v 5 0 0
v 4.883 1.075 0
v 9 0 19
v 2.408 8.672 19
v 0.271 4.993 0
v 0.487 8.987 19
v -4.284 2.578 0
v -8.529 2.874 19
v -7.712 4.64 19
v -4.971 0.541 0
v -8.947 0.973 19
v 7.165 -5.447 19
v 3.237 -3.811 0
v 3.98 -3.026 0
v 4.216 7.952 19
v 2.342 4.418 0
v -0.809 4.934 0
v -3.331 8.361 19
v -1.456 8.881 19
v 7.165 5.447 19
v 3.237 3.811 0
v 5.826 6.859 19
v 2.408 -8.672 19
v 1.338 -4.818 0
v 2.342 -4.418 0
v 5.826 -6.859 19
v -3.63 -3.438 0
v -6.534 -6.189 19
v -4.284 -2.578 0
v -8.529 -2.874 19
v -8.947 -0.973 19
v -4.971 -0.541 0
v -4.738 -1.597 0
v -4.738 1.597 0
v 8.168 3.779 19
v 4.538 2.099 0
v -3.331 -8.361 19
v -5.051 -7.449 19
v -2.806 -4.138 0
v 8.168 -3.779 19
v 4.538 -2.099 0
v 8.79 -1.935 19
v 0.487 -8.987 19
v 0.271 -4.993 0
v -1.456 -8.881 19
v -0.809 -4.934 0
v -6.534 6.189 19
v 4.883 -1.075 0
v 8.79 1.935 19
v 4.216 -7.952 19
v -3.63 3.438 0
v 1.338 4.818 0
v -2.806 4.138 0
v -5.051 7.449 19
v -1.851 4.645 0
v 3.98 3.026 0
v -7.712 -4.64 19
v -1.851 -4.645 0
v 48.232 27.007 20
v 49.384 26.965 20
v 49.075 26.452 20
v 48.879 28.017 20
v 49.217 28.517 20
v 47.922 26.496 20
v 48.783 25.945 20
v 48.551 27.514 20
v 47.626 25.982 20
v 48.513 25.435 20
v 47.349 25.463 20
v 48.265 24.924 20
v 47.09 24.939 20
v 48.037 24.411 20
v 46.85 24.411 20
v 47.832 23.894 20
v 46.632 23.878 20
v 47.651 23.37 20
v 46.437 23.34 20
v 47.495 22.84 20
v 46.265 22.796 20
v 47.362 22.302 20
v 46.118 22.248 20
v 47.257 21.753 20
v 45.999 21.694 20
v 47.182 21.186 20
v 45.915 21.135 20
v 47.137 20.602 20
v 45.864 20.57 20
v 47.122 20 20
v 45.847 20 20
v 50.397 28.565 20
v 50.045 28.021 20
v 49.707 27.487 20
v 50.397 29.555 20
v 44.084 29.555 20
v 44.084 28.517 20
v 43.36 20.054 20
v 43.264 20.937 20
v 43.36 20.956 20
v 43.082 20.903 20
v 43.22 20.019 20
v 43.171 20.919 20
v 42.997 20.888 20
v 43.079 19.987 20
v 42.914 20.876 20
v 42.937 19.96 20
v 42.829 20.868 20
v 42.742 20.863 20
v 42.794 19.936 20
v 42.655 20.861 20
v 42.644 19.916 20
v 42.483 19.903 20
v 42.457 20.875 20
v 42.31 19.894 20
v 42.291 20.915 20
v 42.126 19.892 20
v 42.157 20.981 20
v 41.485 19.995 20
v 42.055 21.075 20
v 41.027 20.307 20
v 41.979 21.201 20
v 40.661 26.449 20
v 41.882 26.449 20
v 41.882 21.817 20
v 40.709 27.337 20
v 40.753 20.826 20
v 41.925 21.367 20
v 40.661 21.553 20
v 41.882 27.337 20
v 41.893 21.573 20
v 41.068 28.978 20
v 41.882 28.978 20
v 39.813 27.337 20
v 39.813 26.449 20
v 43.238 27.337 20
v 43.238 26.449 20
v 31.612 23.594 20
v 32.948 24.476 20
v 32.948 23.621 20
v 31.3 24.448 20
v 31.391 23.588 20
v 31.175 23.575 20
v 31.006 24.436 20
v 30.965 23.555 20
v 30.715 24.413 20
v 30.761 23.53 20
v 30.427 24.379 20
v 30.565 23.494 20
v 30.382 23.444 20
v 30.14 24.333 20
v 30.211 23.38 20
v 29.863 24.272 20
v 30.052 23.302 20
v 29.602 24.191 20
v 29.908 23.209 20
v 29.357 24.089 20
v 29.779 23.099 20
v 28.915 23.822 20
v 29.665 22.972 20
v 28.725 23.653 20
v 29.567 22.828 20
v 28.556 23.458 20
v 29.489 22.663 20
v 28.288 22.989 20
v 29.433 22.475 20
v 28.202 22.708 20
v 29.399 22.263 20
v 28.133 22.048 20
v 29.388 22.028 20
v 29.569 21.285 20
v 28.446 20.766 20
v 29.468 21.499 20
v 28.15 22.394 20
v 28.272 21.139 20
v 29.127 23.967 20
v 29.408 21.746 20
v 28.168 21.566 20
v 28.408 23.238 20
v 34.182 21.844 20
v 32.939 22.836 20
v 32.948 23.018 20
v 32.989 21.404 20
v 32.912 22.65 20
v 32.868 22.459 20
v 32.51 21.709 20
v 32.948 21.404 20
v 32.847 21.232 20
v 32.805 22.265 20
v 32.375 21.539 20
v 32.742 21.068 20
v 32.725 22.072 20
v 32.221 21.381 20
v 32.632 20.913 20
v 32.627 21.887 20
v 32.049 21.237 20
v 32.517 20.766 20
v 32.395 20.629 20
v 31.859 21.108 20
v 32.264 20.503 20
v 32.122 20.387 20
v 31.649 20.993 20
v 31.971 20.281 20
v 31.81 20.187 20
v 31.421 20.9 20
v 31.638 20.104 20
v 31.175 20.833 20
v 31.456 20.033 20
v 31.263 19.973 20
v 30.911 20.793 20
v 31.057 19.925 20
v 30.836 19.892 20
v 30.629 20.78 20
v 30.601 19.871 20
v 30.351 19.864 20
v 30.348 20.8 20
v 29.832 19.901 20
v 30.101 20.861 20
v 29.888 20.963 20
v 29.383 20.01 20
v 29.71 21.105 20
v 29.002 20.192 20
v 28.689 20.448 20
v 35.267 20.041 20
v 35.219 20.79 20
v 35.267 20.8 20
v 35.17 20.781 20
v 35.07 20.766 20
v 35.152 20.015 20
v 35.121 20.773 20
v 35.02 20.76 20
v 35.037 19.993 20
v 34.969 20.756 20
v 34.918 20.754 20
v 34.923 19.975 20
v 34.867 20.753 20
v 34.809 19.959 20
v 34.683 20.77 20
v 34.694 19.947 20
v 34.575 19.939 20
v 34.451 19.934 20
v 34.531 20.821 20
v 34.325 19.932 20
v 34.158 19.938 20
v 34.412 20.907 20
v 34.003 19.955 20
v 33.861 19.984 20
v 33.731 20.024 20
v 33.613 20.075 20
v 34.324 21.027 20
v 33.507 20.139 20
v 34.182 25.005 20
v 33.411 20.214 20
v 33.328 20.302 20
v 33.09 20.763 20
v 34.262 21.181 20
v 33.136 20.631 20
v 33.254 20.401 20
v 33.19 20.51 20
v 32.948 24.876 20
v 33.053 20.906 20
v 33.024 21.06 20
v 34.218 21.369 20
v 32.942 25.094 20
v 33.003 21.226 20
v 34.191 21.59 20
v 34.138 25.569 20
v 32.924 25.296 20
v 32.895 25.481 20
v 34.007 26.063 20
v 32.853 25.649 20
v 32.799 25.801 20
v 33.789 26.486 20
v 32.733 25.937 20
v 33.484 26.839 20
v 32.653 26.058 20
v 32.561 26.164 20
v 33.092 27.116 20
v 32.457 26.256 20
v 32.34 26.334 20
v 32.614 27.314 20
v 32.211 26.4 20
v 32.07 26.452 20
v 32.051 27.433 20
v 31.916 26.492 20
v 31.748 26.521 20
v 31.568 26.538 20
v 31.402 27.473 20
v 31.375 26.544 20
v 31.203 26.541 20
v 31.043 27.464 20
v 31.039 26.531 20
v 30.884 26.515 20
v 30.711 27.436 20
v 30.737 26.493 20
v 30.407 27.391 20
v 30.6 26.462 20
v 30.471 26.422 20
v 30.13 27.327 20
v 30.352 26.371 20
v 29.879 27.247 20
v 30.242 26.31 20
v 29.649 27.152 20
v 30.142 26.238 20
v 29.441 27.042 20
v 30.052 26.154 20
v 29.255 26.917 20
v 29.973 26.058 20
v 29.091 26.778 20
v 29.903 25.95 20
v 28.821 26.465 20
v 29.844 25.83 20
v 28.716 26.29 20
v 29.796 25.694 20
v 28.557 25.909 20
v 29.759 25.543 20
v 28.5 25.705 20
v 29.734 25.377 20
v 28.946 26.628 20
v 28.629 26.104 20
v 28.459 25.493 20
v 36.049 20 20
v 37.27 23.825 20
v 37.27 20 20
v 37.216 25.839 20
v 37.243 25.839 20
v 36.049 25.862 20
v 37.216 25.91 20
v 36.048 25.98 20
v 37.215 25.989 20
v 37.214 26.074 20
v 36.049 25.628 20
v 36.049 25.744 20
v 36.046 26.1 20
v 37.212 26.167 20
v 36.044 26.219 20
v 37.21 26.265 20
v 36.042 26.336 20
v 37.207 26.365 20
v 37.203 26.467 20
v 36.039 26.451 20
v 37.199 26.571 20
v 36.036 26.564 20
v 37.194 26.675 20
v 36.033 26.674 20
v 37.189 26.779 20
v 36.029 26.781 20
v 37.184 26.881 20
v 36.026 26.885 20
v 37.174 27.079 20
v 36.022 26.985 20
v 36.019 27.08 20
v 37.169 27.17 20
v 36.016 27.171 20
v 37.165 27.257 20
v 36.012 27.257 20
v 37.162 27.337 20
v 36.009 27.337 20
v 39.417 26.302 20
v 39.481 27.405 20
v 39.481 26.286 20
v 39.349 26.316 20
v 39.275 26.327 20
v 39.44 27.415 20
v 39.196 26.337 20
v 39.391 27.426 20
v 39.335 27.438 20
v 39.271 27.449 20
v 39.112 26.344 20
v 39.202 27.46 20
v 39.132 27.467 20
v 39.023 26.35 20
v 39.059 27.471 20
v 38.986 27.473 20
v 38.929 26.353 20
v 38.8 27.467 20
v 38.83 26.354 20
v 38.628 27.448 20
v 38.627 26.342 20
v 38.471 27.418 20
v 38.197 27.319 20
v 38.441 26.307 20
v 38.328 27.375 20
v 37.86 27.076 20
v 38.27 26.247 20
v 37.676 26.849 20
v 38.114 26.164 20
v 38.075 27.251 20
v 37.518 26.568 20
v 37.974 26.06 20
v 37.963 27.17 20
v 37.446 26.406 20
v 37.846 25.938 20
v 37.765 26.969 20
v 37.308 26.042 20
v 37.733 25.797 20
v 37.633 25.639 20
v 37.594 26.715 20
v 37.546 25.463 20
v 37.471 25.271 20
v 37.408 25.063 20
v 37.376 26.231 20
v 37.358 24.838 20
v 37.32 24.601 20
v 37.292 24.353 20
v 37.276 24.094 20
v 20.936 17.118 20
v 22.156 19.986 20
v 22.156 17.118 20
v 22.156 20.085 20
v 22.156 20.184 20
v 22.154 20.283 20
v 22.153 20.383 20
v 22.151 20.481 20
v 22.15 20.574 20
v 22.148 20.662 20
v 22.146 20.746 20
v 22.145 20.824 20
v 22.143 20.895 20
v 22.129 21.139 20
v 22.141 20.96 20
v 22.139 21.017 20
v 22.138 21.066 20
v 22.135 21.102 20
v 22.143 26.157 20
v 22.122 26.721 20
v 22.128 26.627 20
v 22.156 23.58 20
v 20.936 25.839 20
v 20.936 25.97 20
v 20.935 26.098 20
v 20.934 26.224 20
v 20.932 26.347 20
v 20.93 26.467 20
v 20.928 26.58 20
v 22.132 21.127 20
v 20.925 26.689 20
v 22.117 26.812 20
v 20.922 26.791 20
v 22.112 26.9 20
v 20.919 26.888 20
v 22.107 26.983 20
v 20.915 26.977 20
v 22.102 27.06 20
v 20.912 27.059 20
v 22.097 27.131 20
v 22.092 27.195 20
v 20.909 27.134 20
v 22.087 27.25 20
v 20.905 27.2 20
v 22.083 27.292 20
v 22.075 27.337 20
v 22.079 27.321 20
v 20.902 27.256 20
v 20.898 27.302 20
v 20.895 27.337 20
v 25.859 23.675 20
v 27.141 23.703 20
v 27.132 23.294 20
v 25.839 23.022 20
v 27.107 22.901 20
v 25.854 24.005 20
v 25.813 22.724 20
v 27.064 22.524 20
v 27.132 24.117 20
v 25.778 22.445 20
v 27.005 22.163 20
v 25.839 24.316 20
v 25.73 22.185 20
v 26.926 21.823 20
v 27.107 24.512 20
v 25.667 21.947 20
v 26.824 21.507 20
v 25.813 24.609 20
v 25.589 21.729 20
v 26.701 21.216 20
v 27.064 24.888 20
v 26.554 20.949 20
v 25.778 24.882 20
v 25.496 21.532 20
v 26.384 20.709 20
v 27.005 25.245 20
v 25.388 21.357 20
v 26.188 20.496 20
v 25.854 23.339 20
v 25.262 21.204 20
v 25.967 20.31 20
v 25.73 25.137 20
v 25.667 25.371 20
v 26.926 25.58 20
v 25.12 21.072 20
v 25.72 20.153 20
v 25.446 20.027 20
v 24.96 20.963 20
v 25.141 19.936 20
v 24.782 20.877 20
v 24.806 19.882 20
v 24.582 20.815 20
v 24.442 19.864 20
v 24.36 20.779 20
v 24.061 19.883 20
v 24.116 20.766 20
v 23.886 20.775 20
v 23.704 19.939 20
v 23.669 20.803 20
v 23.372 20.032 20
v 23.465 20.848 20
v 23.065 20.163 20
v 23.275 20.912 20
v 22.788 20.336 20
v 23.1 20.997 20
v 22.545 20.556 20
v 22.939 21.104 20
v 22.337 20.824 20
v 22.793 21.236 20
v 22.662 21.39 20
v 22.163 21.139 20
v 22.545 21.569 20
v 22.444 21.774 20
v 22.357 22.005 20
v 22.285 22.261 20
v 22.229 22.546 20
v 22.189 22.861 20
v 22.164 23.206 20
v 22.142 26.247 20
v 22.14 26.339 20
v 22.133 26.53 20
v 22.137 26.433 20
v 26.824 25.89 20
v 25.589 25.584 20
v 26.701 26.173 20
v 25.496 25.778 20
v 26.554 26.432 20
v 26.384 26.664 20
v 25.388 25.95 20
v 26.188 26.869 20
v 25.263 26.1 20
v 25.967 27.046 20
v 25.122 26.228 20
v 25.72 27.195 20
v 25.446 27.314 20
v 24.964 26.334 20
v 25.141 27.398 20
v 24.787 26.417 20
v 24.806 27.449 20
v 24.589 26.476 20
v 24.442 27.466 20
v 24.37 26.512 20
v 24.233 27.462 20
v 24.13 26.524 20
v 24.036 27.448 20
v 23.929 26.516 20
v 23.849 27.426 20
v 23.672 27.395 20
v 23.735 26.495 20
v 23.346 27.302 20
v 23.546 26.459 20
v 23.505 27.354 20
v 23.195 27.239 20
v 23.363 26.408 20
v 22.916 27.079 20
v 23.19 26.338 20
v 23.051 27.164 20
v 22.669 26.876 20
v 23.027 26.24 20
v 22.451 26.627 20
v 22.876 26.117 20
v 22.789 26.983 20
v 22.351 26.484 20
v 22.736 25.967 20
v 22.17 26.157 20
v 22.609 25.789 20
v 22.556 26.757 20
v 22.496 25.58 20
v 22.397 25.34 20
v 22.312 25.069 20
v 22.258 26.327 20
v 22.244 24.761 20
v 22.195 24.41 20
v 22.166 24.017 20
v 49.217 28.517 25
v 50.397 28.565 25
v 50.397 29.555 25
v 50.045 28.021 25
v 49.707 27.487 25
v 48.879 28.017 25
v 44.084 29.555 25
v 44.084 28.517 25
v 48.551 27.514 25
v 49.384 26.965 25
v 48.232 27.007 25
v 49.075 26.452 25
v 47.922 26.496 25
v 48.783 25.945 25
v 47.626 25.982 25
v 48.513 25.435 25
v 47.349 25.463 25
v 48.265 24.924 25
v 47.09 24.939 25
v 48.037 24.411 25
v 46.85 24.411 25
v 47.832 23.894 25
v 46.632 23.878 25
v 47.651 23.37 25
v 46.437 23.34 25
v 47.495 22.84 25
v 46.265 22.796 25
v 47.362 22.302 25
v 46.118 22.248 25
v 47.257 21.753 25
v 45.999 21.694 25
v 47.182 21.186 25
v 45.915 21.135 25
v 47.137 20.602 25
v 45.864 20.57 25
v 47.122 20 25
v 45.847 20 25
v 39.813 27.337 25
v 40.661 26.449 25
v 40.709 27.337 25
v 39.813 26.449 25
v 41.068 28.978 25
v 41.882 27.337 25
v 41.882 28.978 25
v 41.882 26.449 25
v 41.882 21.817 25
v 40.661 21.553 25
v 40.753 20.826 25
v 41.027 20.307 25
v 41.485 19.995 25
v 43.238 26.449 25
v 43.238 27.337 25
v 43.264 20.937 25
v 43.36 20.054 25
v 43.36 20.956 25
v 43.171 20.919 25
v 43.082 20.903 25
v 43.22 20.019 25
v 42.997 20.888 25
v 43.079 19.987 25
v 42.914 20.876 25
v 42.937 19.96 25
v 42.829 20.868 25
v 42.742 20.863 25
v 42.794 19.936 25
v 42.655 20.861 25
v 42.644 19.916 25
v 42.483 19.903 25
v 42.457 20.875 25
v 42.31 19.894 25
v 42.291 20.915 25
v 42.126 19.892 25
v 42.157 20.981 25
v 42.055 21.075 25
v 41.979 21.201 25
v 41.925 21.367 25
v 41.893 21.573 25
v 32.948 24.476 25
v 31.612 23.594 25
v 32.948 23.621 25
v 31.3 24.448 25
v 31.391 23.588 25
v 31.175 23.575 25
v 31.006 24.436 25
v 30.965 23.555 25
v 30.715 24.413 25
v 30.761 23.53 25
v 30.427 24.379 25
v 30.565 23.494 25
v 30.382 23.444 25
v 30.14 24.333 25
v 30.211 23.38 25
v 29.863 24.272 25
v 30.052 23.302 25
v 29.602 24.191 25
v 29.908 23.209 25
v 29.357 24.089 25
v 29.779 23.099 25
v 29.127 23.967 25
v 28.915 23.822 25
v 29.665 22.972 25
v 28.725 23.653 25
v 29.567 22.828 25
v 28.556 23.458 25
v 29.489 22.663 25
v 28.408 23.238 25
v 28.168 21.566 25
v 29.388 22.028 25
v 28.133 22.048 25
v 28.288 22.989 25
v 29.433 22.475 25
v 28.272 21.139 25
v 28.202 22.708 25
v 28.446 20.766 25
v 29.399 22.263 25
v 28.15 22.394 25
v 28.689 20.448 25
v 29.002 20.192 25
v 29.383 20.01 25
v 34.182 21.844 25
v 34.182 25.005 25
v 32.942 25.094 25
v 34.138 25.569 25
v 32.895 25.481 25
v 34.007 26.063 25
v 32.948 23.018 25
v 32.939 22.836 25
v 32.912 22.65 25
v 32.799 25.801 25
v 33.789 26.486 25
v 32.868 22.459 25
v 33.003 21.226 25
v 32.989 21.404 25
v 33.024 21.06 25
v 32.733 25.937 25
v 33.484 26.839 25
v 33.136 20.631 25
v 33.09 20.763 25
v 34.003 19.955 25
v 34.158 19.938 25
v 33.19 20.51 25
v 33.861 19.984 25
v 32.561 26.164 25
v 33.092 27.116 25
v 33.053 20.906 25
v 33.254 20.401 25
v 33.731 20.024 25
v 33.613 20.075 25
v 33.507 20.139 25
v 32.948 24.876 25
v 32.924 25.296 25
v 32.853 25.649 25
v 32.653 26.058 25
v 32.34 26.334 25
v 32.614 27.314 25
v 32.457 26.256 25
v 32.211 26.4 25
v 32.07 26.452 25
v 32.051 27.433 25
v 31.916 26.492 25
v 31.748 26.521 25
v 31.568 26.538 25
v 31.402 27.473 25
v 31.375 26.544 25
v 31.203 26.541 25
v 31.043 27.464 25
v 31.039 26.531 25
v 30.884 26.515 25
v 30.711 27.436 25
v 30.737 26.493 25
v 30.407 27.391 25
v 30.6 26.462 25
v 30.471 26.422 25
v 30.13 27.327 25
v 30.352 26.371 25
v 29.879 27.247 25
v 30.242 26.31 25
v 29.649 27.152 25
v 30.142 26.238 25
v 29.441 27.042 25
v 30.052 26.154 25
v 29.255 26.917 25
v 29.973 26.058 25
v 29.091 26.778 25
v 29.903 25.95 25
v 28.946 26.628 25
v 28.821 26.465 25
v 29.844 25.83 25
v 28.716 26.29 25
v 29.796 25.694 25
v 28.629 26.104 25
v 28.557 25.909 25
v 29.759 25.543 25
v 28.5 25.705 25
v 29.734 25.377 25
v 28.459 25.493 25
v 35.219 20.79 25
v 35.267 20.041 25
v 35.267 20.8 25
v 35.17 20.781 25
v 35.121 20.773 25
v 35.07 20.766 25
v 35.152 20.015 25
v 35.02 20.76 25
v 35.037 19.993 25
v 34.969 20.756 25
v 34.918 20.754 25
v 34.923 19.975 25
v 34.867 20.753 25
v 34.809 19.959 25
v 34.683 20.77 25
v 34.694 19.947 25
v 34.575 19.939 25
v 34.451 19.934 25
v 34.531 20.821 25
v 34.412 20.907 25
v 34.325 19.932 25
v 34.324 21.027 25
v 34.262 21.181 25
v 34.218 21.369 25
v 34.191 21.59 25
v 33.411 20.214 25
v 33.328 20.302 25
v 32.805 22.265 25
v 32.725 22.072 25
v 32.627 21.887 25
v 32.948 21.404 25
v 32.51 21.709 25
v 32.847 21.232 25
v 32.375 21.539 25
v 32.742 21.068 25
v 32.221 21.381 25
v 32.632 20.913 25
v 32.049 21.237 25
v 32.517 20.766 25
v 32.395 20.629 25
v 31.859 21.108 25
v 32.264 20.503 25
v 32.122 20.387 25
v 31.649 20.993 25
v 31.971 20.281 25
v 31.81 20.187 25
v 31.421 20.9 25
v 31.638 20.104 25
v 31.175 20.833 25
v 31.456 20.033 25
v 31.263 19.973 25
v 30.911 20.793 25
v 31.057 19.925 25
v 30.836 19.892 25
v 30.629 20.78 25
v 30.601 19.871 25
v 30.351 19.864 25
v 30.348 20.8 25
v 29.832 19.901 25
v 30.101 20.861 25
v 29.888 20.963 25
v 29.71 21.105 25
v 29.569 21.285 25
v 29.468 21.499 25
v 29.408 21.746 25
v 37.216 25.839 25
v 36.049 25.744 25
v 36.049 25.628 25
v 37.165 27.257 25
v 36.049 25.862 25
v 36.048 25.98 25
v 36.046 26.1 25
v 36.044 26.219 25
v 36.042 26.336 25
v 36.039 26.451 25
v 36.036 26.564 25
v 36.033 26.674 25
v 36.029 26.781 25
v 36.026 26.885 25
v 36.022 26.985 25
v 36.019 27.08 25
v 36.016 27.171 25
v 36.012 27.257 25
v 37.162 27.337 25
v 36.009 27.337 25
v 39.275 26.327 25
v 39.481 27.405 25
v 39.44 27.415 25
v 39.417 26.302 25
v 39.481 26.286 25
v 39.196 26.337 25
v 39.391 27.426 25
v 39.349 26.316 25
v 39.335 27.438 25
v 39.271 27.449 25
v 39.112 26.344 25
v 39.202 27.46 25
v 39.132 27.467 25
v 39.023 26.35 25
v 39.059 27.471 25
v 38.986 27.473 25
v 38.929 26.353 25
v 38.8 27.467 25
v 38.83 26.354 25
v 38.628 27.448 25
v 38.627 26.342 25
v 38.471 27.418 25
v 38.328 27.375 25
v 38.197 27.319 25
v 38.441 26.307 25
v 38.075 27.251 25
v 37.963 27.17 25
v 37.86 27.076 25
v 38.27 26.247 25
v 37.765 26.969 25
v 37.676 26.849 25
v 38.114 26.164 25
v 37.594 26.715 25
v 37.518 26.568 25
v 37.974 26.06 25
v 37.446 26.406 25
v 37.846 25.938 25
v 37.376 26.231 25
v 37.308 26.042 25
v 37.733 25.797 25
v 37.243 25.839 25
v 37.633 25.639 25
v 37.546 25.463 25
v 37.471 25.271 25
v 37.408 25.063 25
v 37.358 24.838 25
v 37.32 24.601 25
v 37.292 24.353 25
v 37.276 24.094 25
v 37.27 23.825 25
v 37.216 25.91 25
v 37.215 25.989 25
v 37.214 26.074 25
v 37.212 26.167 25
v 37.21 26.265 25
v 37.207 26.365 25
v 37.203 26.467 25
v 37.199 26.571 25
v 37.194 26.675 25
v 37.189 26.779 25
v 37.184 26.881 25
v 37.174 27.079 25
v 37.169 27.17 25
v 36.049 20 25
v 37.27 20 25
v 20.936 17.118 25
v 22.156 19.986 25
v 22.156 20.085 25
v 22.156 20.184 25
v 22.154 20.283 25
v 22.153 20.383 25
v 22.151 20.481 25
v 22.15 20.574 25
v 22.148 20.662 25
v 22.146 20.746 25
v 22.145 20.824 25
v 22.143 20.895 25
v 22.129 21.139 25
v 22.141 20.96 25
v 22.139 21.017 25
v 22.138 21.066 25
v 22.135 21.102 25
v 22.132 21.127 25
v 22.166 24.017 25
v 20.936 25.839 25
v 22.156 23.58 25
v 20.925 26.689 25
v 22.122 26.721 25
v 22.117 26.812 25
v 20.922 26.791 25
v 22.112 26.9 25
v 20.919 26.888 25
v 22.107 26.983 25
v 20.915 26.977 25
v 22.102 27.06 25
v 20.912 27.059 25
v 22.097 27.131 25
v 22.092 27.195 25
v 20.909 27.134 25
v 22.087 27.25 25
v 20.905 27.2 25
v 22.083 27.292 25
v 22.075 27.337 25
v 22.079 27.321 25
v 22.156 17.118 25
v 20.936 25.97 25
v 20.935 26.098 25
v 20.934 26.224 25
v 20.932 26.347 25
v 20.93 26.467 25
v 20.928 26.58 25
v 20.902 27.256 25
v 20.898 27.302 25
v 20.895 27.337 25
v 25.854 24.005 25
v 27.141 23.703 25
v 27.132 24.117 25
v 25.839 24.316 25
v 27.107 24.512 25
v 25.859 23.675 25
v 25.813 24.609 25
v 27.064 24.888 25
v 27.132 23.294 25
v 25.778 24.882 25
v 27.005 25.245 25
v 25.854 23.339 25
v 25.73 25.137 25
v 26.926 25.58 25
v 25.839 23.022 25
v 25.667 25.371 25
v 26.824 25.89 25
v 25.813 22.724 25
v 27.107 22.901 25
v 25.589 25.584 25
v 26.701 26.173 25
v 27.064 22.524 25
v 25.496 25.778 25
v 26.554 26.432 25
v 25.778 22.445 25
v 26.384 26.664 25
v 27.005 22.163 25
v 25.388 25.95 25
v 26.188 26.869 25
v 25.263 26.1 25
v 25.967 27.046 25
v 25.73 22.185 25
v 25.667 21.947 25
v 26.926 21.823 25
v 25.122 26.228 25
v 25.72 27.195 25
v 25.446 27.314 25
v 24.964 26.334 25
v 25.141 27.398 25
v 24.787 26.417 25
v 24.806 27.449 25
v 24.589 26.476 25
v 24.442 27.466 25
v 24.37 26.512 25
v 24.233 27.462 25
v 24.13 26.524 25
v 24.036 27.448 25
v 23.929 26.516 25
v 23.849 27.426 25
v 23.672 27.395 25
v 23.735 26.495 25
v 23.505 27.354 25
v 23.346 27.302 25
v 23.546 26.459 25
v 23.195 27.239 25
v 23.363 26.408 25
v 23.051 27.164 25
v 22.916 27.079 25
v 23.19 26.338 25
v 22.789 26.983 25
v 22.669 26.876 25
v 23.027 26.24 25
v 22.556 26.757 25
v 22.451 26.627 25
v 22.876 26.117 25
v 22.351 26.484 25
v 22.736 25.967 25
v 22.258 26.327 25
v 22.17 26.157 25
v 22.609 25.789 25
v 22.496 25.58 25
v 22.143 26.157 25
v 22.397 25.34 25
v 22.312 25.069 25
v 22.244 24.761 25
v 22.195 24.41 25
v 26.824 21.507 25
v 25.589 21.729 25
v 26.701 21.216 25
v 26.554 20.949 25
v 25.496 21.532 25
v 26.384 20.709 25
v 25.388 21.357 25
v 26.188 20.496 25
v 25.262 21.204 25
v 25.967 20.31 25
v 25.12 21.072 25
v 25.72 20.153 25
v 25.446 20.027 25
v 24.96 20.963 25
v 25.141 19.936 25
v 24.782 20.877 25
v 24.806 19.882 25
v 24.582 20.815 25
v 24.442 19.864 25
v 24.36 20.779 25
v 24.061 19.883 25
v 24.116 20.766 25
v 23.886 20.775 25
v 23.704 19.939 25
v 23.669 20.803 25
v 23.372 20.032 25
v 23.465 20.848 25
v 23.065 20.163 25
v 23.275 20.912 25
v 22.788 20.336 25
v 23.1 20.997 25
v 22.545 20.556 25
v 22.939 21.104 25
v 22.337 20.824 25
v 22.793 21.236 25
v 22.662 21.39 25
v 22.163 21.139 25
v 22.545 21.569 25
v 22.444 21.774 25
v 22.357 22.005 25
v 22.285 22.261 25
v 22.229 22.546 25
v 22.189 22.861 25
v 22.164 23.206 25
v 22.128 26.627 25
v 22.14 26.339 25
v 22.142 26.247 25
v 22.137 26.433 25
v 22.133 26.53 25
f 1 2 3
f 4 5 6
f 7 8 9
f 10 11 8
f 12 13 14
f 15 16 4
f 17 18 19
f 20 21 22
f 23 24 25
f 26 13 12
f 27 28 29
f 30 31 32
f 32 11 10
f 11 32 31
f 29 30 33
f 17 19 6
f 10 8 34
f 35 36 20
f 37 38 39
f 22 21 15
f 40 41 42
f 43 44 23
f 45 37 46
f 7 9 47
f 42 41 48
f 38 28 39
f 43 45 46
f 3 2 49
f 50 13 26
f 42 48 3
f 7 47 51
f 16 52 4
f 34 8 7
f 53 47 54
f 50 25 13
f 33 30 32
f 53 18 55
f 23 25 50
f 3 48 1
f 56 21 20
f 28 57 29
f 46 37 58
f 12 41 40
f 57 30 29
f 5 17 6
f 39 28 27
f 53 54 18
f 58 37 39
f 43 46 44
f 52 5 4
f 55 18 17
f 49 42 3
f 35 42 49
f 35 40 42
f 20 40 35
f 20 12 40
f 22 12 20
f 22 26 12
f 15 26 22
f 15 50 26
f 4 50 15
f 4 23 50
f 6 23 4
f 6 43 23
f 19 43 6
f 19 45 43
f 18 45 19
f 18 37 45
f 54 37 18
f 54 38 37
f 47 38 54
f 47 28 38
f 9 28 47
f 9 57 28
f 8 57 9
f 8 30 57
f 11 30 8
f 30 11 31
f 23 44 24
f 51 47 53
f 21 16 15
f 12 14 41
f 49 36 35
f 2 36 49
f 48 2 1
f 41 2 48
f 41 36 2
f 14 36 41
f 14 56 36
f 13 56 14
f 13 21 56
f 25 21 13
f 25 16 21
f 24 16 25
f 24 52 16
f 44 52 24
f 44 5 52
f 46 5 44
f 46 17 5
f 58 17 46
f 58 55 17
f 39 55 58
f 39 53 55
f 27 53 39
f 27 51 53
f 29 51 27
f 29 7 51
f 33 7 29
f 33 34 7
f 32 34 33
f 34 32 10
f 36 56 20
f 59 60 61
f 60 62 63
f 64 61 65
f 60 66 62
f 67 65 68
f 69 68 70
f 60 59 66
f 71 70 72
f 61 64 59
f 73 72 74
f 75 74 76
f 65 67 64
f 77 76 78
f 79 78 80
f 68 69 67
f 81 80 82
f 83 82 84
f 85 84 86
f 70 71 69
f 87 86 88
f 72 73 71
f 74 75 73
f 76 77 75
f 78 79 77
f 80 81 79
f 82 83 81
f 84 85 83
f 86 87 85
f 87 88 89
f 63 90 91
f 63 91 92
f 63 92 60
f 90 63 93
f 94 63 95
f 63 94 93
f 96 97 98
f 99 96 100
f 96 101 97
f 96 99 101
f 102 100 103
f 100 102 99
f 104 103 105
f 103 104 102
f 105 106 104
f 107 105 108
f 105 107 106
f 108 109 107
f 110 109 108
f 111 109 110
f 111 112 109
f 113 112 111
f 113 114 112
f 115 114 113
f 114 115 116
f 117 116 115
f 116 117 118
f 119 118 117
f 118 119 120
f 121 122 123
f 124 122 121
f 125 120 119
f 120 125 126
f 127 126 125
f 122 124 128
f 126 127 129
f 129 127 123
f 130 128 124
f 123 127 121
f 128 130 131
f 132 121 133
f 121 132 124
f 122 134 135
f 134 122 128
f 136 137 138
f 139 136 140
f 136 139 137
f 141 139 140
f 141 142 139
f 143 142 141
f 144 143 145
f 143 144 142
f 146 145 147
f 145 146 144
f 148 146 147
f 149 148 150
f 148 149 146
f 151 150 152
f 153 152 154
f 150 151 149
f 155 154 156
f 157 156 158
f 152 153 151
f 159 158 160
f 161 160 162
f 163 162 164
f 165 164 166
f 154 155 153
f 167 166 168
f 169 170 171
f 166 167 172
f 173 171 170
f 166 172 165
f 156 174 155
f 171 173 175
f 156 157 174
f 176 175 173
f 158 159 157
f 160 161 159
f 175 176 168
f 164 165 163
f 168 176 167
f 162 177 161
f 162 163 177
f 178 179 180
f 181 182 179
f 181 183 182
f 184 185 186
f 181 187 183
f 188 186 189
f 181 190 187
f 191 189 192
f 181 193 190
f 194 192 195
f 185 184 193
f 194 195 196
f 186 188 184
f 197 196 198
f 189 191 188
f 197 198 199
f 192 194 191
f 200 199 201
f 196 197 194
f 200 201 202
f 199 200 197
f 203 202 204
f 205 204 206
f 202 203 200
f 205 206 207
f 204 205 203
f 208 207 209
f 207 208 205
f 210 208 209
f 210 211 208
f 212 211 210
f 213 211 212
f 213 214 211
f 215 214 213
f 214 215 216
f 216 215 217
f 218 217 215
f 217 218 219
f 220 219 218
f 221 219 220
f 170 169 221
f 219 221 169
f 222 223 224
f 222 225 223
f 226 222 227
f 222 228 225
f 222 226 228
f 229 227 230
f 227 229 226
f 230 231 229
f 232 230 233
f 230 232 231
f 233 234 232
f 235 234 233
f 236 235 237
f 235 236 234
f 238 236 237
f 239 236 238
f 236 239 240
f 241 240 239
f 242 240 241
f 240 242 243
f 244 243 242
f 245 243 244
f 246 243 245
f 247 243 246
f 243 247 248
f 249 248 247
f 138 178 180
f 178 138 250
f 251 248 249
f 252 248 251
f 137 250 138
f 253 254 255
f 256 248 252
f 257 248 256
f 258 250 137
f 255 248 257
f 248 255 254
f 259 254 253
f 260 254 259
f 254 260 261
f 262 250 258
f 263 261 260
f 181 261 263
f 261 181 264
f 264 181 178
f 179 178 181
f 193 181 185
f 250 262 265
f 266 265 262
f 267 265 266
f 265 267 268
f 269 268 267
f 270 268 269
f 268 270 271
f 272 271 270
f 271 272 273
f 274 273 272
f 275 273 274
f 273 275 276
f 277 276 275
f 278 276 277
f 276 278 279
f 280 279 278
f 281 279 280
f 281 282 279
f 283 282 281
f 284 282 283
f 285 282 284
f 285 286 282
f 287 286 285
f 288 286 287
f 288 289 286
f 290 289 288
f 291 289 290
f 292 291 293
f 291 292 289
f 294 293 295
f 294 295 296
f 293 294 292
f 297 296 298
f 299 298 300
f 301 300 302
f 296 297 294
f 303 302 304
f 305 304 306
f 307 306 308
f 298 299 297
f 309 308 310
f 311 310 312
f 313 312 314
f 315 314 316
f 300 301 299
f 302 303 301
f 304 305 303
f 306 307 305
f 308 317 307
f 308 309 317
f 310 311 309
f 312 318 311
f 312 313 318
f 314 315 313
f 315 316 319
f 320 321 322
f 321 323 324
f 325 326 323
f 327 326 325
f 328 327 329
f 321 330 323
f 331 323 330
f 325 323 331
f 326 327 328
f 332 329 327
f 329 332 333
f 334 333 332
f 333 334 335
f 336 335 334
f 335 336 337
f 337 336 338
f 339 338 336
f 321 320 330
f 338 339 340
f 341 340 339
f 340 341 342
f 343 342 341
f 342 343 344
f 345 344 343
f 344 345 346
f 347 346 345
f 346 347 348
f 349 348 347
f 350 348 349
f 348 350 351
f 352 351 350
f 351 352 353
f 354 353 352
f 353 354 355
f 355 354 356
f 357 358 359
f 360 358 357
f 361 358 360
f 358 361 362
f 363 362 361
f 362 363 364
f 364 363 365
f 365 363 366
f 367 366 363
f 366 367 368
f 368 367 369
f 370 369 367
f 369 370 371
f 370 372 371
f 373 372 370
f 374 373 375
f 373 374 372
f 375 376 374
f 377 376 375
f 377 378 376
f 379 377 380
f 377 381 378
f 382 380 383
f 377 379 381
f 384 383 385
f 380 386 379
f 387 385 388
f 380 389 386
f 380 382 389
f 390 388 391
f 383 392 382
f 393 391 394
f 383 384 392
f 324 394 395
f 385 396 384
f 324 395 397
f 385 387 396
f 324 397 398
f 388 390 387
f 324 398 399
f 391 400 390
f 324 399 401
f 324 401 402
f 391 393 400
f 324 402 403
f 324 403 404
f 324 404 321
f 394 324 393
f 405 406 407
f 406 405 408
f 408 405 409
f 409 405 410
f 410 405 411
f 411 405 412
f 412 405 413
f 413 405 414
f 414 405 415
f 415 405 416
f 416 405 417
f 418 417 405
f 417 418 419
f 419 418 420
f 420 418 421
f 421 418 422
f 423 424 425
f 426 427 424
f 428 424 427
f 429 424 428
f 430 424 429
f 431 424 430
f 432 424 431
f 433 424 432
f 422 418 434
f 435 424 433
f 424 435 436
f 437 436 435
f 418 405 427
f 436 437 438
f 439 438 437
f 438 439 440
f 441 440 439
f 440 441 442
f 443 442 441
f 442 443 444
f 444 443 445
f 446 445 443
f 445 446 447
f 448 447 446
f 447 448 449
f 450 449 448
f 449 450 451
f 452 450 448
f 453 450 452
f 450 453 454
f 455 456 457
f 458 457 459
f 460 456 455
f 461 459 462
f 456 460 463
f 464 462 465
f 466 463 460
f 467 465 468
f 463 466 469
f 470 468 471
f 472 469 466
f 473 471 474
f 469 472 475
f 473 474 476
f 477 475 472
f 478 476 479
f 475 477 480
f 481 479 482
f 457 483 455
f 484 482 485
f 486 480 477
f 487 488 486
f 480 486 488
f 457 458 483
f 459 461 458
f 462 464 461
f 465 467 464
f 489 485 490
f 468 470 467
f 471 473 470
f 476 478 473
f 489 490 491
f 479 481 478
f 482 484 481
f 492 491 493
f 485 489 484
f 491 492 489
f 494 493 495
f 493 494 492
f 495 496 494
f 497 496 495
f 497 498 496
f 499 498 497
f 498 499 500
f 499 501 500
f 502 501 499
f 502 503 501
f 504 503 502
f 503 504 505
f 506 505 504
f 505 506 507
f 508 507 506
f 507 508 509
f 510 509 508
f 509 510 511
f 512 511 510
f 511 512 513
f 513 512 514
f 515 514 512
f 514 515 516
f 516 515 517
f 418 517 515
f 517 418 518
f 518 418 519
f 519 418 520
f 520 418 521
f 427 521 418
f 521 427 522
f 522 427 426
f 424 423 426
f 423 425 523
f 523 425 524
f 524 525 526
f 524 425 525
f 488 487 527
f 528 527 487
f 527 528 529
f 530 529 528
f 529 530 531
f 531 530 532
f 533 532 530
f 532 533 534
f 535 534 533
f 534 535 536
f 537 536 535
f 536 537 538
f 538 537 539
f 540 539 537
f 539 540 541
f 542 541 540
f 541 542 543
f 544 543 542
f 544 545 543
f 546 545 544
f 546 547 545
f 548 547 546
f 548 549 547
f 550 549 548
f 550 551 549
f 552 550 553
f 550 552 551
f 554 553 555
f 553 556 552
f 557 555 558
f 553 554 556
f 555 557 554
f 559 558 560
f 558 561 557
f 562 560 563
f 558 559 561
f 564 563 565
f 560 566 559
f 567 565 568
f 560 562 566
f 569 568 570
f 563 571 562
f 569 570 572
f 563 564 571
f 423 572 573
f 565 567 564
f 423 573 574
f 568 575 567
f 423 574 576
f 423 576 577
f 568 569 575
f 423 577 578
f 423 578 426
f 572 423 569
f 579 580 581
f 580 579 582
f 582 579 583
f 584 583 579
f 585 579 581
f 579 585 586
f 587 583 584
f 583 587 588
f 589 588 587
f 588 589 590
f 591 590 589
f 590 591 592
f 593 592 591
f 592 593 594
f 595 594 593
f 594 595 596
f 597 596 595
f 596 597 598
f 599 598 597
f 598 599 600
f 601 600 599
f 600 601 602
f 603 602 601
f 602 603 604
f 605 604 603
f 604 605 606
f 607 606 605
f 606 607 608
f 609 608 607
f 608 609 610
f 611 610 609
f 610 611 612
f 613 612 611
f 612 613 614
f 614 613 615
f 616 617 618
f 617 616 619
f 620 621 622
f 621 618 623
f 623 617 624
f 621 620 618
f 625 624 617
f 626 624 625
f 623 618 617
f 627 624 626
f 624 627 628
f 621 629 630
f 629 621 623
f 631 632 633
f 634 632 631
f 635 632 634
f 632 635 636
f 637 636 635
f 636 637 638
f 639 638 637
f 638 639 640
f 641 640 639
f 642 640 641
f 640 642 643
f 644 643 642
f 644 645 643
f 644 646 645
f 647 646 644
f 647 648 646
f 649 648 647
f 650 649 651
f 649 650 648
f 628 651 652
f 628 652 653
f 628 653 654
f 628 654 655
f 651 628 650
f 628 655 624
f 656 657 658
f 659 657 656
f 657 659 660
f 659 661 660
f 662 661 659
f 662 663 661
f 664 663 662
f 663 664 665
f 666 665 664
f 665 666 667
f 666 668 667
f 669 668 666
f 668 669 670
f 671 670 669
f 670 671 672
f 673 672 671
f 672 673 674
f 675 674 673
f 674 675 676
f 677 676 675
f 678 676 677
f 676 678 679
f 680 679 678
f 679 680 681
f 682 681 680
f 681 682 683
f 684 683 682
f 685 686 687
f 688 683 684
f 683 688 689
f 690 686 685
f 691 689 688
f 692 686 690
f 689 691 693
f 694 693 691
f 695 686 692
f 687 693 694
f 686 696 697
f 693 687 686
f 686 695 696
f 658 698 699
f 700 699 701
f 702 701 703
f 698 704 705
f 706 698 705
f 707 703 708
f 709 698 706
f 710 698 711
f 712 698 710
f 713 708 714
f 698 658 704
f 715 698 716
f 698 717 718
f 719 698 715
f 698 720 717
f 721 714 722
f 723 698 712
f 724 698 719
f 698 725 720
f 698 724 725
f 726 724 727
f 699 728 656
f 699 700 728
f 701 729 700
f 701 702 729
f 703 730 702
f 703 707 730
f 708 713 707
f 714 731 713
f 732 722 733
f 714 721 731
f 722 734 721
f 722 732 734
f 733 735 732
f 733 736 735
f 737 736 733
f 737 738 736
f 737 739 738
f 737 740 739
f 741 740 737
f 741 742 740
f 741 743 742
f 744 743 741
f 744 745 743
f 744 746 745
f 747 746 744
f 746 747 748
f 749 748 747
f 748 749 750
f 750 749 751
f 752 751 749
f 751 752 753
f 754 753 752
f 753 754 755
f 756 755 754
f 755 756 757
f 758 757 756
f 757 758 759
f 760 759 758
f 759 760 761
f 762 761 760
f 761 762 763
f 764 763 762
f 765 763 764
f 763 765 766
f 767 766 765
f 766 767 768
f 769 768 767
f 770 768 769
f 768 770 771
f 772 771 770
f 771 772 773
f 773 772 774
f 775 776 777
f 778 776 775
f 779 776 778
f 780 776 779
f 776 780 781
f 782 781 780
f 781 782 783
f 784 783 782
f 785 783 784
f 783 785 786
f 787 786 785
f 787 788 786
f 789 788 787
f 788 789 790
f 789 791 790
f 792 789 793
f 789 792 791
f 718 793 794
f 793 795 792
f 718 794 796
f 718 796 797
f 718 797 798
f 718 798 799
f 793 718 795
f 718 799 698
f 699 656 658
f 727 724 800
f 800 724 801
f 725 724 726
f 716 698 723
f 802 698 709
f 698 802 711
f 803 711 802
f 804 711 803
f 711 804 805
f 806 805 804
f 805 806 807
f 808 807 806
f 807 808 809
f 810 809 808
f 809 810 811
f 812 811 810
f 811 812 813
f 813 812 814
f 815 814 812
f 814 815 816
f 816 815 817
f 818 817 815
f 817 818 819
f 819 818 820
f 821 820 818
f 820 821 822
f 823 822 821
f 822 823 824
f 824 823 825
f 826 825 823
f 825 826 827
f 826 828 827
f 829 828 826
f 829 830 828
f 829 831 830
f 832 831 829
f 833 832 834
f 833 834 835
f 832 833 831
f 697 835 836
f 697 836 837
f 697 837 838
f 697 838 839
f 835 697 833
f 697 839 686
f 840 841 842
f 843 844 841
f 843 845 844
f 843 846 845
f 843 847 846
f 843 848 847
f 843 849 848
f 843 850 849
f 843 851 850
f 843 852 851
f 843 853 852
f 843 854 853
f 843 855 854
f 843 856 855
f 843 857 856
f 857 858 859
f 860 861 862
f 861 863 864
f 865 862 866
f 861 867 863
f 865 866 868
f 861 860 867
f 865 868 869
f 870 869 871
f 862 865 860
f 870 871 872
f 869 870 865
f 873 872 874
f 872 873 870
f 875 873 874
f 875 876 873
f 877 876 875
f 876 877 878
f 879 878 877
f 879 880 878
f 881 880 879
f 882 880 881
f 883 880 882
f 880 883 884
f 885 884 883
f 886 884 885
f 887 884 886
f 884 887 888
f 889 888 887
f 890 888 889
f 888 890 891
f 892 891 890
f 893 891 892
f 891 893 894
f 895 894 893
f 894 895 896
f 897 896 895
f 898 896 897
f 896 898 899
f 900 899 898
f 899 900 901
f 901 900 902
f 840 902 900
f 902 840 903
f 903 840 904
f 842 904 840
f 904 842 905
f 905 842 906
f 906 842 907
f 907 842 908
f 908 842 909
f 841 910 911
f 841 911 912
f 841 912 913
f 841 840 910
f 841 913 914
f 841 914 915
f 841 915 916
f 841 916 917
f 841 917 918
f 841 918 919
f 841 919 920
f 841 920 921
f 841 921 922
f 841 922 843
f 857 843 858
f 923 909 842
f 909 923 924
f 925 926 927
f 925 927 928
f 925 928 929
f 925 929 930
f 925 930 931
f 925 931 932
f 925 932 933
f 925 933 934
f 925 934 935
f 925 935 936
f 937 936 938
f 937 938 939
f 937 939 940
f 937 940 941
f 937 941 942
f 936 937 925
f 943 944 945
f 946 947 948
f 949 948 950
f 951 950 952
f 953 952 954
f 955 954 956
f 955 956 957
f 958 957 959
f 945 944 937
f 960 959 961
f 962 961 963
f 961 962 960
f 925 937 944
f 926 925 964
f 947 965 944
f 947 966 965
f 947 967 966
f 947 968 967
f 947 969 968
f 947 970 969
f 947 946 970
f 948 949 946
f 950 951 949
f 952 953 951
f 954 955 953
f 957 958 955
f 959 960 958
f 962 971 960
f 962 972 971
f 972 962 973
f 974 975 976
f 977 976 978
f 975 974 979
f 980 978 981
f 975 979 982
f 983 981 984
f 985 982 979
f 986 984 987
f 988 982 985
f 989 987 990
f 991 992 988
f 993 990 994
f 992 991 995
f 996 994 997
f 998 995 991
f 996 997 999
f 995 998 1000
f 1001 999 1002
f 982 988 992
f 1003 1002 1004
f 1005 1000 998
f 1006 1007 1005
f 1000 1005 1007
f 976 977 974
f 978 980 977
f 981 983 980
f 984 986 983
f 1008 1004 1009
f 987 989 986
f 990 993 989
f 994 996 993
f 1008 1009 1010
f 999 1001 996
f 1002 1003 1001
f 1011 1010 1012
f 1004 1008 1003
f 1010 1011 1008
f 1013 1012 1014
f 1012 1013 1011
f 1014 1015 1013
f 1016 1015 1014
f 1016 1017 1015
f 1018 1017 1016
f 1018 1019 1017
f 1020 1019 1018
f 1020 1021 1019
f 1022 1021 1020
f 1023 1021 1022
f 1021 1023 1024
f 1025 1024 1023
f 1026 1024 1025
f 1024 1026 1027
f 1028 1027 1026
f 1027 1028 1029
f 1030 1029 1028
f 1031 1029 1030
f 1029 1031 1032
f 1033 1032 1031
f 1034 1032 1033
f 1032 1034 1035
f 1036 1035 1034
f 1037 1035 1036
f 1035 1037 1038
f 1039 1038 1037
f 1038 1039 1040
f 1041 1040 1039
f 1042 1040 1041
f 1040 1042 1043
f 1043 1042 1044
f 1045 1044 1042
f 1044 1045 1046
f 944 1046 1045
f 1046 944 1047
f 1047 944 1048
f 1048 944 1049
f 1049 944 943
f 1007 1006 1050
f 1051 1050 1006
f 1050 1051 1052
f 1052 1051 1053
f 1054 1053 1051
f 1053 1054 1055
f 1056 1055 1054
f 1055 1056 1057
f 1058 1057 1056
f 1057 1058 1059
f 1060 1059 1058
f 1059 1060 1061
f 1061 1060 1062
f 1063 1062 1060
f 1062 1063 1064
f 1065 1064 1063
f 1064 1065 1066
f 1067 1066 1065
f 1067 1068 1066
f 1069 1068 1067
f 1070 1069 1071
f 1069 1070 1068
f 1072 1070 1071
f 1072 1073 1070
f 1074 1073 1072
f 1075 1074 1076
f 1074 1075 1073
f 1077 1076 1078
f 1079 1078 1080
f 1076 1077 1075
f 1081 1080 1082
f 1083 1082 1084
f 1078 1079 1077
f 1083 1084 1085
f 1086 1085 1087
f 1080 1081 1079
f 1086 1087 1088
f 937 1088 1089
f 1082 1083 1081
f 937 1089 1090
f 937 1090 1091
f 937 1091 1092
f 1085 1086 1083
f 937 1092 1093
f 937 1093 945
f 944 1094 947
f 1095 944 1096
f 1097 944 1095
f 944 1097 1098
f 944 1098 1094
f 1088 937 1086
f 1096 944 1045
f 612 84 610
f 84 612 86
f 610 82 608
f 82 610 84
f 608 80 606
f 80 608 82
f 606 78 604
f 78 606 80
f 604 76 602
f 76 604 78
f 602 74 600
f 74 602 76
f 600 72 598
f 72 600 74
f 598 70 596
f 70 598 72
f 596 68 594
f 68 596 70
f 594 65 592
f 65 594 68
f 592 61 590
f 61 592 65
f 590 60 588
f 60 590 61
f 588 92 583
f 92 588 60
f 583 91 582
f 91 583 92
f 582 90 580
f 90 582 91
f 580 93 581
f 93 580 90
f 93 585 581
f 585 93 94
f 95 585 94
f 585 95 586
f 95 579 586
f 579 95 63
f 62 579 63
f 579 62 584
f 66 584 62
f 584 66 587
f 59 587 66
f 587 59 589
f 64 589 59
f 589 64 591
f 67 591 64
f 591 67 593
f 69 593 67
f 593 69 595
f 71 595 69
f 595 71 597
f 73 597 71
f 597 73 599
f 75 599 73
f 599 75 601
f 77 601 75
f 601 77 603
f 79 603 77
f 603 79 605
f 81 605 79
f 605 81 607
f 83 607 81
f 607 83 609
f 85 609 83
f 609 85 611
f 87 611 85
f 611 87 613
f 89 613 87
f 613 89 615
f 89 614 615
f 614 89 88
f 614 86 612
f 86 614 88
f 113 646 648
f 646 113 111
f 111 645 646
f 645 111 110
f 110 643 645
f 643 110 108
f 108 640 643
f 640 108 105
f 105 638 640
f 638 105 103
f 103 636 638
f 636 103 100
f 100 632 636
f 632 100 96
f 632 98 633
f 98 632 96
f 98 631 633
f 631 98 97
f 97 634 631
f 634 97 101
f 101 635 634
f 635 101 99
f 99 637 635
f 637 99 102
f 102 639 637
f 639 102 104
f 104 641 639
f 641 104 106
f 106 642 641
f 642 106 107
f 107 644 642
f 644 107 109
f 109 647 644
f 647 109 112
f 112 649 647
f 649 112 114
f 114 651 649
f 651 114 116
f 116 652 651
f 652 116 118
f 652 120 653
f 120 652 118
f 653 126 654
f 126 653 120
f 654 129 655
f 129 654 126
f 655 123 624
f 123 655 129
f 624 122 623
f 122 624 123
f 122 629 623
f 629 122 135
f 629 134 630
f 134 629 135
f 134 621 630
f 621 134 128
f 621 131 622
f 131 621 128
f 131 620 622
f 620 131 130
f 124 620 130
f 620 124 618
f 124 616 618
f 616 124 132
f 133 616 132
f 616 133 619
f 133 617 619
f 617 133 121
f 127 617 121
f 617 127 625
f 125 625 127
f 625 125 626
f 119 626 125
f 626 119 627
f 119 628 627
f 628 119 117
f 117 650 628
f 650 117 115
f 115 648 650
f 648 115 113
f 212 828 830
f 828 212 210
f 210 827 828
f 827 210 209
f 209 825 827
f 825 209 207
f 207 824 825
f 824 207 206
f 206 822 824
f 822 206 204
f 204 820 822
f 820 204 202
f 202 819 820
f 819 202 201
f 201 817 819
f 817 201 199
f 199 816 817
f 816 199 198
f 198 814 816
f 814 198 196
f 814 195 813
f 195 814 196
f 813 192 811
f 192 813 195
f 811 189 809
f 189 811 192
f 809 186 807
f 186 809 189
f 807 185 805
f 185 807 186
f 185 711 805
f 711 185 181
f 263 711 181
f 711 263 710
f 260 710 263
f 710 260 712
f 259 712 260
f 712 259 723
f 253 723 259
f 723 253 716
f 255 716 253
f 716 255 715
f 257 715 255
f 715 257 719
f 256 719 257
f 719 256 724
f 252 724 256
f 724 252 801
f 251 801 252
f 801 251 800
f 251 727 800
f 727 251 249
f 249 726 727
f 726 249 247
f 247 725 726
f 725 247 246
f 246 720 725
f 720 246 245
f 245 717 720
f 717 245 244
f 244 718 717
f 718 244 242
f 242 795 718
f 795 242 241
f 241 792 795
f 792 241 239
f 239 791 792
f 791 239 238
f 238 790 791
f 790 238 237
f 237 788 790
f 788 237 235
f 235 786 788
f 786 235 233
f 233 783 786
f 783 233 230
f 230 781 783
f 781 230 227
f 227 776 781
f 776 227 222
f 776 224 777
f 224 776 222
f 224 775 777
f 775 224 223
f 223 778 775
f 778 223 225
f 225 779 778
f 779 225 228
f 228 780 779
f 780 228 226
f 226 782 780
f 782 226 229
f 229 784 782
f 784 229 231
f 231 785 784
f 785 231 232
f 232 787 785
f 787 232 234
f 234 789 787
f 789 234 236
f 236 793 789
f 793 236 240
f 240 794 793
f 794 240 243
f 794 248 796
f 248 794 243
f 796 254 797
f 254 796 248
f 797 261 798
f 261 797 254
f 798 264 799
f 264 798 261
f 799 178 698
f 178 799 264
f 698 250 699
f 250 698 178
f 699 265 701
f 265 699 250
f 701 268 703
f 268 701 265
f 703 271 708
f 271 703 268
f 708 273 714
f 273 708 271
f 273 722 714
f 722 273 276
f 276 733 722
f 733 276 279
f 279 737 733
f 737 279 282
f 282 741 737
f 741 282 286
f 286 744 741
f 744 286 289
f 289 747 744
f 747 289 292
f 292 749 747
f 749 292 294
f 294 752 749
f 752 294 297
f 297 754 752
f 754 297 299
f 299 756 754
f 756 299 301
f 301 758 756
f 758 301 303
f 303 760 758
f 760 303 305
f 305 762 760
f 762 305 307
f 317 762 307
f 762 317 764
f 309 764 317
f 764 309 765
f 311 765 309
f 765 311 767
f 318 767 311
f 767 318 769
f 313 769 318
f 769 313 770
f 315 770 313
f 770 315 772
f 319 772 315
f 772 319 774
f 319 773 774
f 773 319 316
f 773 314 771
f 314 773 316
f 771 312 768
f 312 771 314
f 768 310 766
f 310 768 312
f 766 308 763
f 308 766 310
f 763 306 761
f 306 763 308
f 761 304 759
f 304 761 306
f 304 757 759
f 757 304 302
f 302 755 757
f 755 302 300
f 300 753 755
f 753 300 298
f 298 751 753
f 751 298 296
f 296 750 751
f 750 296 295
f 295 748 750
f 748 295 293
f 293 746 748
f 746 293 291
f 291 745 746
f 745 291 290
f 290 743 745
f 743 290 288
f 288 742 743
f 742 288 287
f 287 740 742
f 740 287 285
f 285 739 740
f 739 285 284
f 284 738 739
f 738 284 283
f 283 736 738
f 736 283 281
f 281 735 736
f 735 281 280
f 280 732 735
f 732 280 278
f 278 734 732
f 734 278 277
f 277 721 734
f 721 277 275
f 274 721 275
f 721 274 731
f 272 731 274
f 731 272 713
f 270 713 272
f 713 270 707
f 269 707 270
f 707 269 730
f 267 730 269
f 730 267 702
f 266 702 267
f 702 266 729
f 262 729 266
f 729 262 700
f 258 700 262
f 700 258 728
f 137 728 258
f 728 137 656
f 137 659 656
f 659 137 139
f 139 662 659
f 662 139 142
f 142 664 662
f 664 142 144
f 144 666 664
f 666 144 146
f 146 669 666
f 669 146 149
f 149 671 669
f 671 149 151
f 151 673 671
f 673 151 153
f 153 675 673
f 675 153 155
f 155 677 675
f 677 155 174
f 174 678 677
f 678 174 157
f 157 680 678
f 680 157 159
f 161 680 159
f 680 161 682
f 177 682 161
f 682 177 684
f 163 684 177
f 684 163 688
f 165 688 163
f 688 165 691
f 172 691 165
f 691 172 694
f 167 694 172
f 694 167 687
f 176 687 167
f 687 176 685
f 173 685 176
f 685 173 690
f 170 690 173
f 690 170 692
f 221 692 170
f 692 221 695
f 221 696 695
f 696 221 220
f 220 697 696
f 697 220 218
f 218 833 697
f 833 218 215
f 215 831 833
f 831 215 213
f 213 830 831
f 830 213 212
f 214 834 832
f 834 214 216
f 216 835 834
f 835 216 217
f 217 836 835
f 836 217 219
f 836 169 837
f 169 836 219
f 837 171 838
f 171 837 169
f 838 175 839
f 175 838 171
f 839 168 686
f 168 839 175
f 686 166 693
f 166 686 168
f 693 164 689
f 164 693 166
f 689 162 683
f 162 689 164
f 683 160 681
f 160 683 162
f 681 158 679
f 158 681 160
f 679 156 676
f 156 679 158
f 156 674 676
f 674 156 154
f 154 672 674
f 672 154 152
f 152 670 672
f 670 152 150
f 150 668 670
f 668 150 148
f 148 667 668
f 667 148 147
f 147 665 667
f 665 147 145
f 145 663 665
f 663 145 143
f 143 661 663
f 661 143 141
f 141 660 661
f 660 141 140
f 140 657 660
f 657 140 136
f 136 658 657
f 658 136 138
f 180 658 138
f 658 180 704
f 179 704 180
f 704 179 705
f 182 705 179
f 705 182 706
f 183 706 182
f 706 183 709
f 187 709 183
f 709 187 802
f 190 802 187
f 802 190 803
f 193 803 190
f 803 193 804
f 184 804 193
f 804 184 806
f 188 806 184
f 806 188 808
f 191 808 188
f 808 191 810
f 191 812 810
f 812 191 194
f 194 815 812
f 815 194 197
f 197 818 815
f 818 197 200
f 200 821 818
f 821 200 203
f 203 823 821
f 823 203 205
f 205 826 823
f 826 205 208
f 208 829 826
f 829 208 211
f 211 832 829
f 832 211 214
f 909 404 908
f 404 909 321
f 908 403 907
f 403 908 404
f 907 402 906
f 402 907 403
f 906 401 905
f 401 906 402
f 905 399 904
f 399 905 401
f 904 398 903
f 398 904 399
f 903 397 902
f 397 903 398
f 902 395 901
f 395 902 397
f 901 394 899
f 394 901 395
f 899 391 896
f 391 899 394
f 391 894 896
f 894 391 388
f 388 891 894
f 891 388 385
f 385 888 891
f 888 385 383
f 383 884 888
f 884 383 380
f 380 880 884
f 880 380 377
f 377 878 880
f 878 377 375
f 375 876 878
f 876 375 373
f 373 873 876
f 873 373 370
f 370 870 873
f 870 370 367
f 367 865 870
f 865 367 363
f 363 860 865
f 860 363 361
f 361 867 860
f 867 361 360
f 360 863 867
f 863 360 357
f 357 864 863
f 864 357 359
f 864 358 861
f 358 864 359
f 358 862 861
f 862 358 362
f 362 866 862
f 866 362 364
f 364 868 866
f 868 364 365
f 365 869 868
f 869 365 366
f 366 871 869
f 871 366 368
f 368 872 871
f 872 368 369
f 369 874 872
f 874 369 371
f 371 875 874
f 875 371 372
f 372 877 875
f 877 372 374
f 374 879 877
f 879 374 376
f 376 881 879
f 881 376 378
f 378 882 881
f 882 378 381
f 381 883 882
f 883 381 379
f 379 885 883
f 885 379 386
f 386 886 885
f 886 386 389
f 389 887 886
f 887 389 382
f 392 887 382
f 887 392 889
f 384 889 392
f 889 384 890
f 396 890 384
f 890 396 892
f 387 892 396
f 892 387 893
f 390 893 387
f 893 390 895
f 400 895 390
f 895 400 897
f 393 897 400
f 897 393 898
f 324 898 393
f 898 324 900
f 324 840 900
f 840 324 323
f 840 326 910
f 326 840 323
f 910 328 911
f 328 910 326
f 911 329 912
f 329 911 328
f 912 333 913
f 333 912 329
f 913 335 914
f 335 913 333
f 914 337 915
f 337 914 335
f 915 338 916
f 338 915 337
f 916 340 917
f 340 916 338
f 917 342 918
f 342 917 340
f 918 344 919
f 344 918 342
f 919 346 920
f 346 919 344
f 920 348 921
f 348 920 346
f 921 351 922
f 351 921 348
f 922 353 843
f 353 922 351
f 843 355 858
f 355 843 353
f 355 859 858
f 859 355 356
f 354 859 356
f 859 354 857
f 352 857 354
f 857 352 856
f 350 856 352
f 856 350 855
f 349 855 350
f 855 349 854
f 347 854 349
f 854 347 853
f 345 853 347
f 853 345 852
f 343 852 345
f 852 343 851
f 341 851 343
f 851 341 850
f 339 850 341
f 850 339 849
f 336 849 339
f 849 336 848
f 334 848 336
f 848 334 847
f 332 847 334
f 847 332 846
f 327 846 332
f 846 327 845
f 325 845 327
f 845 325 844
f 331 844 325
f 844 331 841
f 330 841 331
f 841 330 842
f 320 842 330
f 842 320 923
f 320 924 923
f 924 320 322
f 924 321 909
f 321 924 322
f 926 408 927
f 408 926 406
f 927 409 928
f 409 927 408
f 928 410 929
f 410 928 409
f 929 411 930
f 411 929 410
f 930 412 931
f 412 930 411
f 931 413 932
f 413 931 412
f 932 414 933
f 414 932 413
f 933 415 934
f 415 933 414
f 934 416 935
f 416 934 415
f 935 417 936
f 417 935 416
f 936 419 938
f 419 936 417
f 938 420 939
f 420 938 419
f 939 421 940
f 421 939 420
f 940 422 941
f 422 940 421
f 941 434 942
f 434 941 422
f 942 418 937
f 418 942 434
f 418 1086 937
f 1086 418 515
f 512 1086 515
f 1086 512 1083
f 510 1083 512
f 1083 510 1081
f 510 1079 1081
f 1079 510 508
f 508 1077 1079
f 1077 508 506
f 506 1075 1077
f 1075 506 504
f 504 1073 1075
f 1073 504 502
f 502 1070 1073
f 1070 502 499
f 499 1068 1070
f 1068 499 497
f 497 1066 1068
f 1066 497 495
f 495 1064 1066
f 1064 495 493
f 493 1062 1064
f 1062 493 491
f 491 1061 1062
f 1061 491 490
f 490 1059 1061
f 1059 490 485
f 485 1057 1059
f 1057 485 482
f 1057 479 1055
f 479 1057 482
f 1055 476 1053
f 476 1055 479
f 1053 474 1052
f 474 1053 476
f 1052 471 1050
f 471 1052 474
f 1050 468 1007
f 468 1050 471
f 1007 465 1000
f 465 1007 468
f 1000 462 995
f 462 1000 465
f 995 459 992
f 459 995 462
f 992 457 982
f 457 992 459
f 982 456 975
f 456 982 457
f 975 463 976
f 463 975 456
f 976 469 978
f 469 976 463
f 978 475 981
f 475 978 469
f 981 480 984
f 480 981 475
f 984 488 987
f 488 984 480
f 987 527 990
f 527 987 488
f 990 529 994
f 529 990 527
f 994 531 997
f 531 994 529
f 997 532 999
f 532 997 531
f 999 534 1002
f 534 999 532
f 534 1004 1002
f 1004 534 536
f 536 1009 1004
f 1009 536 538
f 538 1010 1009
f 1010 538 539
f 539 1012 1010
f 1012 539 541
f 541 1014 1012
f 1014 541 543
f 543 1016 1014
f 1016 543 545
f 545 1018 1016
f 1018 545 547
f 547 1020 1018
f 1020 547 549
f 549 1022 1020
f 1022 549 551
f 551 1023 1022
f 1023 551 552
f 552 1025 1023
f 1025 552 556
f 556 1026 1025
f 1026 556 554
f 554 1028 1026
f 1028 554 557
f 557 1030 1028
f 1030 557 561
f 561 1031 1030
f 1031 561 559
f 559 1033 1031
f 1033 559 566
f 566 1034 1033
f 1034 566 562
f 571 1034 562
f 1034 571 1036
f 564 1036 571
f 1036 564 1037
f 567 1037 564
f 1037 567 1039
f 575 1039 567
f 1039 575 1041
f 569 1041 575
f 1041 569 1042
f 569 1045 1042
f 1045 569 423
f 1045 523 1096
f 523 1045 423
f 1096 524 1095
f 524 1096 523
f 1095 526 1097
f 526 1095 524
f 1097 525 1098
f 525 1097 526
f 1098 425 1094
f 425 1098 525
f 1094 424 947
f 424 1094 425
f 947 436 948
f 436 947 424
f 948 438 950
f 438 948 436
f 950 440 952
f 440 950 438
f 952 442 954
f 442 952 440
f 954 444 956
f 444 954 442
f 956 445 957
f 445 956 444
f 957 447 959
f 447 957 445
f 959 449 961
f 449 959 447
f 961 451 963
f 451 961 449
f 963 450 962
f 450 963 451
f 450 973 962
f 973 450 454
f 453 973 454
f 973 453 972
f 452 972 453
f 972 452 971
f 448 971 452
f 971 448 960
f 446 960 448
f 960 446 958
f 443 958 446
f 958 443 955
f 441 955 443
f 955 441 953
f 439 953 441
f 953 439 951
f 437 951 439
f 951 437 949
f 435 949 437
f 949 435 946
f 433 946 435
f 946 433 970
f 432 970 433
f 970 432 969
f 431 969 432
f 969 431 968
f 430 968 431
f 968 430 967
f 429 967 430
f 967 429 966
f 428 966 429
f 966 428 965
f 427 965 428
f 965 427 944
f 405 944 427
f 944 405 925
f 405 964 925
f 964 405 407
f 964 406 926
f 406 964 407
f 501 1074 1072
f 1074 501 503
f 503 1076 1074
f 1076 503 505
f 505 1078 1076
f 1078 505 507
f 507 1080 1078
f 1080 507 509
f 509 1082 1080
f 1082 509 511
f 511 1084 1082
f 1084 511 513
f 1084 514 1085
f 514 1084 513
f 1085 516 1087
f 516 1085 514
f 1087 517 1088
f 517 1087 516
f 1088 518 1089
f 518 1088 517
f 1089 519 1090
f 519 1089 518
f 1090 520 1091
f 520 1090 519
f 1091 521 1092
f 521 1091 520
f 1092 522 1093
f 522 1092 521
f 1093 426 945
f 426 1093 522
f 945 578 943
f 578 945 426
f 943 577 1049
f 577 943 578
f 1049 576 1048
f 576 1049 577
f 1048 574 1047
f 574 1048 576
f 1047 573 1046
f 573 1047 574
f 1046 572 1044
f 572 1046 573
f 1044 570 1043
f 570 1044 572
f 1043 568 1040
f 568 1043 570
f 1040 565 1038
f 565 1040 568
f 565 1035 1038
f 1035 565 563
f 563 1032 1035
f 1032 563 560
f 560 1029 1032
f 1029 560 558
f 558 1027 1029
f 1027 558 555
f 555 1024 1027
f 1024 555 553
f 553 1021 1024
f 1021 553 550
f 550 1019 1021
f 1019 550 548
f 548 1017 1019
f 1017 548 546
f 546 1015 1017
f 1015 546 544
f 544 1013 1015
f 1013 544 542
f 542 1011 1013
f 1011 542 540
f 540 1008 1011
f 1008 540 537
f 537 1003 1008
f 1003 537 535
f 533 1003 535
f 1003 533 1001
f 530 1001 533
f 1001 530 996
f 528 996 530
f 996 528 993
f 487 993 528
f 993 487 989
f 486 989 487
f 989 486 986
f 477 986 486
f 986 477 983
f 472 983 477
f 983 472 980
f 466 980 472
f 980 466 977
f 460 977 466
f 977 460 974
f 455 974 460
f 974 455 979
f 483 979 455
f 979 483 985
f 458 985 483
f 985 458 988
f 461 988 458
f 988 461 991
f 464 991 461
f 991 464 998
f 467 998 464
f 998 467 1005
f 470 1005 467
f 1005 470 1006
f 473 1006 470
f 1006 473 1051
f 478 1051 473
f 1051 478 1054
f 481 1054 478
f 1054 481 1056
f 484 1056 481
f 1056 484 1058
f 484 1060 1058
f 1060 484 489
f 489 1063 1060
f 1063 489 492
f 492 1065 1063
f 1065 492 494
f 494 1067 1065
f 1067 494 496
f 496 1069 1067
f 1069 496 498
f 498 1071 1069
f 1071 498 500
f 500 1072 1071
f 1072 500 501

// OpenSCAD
//[CUSTOMIZATION]
// Height
h=19; // [10:100]
// Radius 1
r1=5; // [5,10,15]
// Radius 2
r2=9;
// Message
txt="part7";
// I love it
boolvar=true;
module __END_CUSTOMIZATIONS () { }
cylinder(h,r1,r2);
translate([20,20,20]) { linear_extrude(5) text(txt, font="Liberation Sans"); }
